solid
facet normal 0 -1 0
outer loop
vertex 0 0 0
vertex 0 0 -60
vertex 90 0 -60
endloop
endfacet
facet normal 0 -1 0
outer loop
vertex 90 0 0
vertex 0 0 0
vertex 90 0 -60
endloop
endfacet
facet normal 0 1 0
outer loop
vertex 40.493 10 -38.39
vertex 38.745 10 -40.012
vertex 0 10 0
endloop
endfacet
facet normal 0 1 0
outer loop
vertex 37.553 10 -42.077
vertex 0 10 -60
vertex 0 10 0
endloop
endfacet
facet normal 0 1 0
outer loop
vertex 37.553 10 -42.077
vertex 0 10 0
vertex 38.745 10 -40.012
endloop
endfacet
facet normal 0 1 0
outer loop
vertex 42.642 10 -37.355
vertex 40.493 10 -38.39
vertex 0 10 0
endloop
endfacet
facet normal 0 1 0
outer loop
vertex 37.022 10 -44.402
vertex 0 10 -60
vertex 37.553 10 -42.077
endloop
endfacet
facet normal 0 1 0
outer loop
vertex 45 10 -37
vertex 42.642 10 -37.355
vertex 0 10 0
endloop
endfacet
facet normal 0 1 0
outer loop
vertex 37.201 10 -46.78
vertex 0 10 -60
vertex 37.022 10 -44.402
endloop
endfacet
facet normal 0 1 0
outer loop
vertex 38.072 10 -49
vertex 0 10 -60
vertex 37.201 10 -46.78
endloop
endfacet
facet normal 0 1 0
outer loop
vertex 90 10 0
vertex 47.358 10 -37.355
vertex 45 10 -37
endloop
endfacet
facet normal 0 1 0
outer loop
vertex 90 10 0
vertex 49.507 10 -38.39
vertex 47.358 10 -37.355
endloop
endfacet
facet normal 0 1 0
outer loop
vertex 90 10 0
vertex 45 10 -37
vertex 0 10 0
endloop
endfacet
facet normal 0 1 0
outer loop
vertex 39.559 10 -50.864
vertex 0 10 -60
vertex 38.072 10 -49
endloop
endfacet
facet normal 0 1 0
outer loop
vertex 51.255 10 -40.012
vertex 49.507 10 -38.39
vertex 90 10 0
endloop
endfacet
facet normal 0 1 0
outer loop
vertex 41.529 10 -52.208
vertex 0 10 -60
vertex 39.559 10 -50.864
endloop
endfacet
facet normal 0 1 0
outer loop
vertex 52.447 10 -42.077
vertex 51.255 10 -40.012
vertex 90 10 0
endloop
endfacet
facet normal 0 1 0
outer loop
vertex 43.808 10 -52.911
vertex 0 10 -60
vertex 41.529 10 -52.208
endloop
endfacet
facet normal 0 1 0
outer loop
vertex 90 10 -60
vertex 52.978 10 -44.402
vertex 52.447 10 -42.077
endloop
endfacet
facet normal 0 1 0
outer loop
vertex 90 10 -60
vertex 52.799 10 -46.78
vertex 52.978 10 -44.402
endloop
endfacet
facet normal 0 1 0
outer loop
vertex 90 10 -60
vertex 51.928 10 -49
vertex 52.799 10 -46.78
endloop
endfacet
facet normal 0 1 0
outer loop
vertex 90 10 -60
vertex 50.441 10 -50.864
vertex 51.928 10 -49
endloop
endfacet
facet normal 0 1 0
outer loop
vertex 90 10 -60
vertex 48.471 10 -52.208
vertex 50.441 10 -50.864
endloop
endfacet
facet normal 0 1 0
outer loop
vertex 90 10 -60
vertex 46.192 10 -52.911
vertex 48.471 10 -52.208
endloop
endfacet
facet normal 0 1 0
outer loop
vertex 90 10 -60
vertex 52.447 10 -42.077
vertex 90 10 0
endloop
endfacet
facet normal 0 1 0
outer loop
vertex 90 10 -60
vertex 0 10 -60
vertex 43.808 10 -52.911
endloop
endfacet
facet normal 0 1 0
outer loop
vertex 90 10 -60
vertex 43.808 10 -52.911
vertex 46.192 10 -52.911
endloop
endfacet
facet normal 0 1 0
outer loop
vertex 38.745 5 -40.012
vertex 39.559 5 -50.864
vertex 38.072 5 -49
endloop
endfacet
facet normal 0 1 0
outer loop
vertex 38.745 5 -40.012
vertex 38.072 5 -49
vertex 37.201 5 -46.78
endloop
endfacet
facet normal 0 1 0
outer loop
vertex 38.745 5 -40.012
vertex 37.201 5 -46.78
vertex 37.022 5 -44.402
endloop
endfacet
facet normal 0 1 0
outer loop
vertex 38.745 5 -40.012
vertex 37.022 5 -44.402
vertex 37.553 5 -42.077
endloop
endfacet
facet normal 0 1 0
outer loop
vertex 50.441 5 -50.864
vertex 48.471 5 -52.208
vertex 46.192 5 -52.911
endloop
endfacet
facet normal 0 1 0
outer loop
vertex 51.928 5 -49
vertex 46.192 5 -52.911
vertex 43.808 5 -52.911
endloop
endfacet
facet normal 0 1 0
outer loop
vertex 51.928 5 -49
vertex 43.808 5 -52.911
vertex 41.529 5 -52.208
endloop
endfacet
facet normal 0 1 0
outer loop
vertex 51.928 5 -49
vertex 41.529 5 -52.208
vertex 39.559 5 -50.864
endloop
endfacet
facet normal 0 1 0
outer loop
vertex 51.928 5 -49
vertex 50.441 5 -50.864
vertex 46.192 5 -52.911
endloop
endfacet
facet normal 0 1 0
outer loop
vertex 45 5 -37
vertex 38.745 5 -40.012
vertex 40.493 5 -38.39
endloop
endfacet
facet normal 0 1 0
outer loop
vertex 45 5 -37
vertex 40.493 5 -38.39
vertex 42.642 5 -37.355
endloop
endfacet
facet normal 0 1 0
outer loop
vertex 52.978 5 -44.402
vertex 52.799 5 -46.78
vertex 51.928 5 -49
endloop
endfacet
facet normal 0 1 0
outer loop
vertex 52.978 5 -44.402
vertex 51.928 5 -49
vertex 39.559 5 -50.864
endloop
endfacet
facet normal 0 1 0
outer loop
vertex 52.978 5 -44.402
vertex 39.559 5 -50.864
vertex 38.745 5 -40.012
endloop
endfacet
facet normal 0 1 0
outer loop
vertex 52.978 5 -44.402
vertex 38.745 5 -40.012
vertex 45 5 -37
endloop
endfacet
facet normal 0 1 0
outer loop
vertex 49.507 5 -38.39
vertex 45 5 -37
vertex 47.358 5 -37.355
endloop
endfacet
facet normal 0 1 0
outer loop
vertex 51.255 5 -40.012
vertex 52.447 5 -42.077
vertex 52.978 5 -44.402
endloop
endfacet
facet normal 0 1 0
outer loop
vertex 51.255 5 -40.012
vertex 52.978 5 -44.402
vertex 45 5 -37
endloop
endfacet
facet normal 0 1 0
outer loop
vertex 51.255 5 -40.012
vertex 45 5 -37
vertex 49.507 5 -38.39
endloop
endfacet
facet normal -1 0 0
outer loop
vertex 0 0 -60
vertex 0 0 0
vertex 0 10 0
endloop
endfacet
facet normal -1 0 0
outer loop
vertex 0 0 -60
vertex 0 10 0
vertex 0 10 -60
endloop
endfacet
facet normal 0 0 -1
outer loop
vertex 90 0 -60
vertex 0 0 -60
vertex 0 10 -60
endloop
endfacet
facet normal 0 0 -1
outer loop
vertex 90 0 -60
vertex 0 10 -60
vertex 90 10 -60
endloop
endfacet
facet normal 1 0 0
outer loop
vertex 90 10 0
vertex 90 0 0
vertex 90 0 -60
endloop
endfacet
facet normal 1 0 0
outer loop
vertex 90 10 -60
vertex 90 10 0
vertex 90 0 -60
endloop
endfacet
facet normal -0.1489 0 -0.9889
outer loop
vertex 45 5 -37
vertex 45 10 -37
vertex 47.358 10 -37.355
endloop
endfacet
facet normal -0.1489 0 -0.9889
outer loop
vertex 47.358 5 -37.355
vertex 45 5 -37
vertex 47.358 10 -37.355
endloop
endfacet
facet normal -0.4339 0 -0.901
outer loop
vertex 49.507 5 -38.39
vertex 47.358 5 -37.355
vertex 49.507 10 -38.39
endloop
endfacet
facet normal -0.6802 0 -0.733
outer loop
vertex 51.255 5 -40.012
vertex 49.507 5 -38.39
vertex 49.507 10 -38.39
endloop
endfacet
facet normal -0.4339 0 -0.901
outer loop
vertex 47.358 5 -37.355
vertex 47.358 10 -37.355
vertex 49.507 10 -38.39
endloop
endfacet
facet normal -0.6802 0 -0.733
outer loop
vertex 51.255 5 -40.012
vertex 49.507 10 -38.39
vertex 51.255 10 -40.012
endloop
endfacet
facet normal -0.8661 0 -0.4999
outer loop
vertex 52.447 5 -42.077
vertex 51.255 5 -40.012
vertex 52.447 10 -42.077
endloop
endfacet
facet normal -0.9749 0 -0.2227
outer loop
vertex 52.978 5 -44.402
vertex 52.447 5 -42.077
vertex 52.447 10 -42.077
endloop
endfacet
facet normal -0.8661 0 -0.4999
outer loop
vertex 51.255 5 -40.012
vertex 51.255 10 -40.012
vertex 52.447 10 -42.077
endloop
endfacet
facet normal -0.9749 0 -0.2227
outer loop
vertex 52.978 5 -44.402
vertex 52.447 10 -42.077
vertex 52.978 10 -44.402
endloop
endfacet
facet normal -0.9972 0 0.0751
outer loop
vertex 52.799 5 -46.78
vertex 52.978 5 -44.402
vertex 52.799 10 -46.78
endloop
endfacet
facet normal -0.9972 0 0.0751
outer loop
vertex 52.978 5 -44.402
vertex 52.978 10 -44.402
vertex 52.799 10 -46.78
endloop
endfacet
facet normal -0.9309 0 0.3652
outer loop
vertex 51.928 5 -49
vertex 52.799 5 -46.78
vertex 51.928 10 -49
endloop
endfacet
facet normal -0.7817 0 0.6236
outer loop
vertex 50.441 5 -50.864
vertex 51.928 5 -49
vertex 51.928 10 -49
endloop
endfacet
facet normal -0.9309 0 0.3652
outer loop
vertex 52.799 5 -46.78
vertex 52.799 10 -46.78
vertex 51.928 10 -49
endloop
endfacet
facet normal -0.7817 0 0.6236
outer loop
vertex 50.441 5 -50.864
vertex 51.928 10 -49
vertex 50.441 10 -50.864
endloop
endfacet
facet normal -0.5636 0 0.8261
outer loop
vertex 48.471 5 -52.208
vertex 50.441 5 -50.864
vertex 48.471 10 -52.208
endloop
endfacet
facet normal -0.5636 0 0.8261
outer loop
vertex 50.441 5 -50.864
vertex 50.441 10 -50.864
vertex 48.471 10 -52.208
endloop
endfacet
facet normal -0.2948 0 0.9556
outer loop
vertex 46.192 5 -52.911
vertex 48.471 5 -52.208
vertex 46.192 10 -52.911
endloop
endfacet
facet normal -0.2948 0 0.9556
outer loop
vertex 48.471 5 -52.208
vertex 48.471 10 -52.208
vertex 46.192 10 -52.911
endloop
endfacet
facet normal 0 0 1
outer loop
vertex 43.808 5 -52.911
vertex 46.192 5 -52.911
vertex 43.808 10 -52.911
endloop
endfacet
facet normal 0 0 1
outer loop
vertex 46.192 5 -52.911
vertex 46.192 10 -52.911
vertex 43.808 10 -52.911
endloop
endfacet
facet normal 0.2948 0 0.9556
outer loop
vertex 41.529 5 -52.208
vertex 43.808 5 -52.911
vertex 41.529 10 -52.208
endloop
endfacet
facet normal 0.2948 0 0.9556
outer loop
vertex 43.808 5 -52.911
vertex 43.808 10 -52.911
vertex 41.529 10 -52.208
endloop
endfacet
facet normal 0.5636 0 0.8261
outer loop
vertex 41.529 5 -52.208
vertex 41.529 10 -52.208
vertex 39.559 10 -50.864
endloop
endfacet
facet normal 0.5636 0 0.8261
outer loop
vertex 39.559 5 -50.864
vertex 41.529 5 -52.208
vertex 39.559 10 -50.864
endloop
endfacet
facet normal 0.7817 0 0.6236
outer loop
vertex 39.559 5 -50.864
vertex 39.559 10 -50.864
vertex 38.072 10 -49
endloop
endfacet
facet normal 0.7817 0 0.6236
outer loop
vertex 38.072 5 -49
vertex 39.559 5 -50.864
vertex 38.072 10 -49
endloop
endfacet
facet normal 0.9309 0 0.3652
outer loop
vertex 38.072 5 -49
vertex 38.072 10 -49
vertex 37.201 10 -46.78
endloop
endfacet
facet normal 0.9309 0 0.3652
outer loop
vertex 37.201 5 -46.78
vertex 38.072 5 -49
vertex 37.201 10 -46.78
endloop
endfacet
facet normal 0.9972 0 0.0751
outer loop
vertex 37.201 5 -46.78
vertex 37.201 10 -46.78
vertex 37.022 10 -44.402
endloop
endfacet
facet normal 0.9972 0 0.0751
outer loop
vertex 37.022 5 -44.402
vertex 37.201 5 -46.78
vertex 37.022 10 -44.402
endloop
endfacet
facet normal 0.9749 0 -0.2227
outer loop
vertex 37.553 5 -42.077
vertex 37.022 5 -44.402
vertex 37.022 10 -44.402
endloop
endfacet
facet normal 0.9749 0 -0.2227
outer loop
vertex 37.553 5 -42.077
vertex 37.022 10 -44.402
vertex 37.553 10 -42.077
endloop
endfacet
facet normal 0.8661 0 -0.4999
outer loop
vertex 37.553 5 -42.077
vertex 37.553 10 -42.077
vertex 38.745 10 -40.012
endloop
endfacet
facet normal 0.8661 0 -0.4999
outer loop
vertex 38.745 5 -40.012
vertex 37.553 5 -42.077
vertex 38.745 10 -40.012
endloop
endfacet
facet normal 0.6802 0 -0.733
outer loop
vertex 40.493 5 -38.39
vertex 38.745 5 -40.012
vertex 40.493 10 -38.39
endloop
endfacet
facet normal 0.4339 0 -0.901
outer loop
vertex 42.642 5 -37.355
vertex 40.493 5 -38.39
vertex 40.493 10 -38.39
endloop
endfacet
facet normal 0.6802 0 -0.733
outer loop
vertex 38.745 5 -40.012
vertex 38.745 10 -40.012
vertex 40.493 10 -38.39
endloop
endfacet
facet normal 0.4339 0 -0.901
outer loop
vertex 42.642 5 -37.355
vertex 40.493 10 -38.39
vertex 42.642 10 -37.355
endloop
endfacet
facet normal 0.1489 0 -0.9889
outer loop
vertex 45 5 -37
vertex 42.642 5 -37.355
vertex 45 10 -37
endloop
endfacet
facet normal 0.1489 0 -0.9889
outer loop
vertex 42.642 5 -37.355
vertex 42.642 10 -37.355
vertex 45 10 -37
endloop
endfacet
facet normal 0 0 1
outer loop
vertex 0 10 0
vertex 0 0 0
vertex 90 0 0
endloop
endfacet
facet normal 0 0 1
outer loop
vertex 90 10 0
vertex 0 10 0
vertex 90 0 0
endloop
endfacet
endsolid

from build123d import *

# Parameters (mm, degrees)
SKETCH1_W      = 90
SKETCH1_H      = 60
EXTRUDE1_DEPTH = 10
SKETCH2_R      = 8
EXTRUDE2_DEPTH = 5


with BuildPart() as part:
    # Sketch1 → Extrude1 (new body)
    with BuildSketch(Plane(origin=(0, 0, 0), x_dir=(1, 0, 0), z_dir=(0, 1, 0))):
        with Locations((45, 30)):
            Rectangle(SKETCH1_W, SKETCH1_H)
    extrude(amount=EXTRUDE1_DEPTH)

    # Sketch2 → Extrude2 (cut)
    with BuildSketch(Plane(origin=(0, 10, 0), x_dir=(1, 0, 0), z_dir=(0, 1, 0))):
        with Locations(Location((45, 45, 0), (0, 0, 270))):
            Circle(SKETCH2_R)
    extrude(amount=-EXTRUDE2_DEPTH, mode=Mode.SUBTRACT)


solid = part.part
